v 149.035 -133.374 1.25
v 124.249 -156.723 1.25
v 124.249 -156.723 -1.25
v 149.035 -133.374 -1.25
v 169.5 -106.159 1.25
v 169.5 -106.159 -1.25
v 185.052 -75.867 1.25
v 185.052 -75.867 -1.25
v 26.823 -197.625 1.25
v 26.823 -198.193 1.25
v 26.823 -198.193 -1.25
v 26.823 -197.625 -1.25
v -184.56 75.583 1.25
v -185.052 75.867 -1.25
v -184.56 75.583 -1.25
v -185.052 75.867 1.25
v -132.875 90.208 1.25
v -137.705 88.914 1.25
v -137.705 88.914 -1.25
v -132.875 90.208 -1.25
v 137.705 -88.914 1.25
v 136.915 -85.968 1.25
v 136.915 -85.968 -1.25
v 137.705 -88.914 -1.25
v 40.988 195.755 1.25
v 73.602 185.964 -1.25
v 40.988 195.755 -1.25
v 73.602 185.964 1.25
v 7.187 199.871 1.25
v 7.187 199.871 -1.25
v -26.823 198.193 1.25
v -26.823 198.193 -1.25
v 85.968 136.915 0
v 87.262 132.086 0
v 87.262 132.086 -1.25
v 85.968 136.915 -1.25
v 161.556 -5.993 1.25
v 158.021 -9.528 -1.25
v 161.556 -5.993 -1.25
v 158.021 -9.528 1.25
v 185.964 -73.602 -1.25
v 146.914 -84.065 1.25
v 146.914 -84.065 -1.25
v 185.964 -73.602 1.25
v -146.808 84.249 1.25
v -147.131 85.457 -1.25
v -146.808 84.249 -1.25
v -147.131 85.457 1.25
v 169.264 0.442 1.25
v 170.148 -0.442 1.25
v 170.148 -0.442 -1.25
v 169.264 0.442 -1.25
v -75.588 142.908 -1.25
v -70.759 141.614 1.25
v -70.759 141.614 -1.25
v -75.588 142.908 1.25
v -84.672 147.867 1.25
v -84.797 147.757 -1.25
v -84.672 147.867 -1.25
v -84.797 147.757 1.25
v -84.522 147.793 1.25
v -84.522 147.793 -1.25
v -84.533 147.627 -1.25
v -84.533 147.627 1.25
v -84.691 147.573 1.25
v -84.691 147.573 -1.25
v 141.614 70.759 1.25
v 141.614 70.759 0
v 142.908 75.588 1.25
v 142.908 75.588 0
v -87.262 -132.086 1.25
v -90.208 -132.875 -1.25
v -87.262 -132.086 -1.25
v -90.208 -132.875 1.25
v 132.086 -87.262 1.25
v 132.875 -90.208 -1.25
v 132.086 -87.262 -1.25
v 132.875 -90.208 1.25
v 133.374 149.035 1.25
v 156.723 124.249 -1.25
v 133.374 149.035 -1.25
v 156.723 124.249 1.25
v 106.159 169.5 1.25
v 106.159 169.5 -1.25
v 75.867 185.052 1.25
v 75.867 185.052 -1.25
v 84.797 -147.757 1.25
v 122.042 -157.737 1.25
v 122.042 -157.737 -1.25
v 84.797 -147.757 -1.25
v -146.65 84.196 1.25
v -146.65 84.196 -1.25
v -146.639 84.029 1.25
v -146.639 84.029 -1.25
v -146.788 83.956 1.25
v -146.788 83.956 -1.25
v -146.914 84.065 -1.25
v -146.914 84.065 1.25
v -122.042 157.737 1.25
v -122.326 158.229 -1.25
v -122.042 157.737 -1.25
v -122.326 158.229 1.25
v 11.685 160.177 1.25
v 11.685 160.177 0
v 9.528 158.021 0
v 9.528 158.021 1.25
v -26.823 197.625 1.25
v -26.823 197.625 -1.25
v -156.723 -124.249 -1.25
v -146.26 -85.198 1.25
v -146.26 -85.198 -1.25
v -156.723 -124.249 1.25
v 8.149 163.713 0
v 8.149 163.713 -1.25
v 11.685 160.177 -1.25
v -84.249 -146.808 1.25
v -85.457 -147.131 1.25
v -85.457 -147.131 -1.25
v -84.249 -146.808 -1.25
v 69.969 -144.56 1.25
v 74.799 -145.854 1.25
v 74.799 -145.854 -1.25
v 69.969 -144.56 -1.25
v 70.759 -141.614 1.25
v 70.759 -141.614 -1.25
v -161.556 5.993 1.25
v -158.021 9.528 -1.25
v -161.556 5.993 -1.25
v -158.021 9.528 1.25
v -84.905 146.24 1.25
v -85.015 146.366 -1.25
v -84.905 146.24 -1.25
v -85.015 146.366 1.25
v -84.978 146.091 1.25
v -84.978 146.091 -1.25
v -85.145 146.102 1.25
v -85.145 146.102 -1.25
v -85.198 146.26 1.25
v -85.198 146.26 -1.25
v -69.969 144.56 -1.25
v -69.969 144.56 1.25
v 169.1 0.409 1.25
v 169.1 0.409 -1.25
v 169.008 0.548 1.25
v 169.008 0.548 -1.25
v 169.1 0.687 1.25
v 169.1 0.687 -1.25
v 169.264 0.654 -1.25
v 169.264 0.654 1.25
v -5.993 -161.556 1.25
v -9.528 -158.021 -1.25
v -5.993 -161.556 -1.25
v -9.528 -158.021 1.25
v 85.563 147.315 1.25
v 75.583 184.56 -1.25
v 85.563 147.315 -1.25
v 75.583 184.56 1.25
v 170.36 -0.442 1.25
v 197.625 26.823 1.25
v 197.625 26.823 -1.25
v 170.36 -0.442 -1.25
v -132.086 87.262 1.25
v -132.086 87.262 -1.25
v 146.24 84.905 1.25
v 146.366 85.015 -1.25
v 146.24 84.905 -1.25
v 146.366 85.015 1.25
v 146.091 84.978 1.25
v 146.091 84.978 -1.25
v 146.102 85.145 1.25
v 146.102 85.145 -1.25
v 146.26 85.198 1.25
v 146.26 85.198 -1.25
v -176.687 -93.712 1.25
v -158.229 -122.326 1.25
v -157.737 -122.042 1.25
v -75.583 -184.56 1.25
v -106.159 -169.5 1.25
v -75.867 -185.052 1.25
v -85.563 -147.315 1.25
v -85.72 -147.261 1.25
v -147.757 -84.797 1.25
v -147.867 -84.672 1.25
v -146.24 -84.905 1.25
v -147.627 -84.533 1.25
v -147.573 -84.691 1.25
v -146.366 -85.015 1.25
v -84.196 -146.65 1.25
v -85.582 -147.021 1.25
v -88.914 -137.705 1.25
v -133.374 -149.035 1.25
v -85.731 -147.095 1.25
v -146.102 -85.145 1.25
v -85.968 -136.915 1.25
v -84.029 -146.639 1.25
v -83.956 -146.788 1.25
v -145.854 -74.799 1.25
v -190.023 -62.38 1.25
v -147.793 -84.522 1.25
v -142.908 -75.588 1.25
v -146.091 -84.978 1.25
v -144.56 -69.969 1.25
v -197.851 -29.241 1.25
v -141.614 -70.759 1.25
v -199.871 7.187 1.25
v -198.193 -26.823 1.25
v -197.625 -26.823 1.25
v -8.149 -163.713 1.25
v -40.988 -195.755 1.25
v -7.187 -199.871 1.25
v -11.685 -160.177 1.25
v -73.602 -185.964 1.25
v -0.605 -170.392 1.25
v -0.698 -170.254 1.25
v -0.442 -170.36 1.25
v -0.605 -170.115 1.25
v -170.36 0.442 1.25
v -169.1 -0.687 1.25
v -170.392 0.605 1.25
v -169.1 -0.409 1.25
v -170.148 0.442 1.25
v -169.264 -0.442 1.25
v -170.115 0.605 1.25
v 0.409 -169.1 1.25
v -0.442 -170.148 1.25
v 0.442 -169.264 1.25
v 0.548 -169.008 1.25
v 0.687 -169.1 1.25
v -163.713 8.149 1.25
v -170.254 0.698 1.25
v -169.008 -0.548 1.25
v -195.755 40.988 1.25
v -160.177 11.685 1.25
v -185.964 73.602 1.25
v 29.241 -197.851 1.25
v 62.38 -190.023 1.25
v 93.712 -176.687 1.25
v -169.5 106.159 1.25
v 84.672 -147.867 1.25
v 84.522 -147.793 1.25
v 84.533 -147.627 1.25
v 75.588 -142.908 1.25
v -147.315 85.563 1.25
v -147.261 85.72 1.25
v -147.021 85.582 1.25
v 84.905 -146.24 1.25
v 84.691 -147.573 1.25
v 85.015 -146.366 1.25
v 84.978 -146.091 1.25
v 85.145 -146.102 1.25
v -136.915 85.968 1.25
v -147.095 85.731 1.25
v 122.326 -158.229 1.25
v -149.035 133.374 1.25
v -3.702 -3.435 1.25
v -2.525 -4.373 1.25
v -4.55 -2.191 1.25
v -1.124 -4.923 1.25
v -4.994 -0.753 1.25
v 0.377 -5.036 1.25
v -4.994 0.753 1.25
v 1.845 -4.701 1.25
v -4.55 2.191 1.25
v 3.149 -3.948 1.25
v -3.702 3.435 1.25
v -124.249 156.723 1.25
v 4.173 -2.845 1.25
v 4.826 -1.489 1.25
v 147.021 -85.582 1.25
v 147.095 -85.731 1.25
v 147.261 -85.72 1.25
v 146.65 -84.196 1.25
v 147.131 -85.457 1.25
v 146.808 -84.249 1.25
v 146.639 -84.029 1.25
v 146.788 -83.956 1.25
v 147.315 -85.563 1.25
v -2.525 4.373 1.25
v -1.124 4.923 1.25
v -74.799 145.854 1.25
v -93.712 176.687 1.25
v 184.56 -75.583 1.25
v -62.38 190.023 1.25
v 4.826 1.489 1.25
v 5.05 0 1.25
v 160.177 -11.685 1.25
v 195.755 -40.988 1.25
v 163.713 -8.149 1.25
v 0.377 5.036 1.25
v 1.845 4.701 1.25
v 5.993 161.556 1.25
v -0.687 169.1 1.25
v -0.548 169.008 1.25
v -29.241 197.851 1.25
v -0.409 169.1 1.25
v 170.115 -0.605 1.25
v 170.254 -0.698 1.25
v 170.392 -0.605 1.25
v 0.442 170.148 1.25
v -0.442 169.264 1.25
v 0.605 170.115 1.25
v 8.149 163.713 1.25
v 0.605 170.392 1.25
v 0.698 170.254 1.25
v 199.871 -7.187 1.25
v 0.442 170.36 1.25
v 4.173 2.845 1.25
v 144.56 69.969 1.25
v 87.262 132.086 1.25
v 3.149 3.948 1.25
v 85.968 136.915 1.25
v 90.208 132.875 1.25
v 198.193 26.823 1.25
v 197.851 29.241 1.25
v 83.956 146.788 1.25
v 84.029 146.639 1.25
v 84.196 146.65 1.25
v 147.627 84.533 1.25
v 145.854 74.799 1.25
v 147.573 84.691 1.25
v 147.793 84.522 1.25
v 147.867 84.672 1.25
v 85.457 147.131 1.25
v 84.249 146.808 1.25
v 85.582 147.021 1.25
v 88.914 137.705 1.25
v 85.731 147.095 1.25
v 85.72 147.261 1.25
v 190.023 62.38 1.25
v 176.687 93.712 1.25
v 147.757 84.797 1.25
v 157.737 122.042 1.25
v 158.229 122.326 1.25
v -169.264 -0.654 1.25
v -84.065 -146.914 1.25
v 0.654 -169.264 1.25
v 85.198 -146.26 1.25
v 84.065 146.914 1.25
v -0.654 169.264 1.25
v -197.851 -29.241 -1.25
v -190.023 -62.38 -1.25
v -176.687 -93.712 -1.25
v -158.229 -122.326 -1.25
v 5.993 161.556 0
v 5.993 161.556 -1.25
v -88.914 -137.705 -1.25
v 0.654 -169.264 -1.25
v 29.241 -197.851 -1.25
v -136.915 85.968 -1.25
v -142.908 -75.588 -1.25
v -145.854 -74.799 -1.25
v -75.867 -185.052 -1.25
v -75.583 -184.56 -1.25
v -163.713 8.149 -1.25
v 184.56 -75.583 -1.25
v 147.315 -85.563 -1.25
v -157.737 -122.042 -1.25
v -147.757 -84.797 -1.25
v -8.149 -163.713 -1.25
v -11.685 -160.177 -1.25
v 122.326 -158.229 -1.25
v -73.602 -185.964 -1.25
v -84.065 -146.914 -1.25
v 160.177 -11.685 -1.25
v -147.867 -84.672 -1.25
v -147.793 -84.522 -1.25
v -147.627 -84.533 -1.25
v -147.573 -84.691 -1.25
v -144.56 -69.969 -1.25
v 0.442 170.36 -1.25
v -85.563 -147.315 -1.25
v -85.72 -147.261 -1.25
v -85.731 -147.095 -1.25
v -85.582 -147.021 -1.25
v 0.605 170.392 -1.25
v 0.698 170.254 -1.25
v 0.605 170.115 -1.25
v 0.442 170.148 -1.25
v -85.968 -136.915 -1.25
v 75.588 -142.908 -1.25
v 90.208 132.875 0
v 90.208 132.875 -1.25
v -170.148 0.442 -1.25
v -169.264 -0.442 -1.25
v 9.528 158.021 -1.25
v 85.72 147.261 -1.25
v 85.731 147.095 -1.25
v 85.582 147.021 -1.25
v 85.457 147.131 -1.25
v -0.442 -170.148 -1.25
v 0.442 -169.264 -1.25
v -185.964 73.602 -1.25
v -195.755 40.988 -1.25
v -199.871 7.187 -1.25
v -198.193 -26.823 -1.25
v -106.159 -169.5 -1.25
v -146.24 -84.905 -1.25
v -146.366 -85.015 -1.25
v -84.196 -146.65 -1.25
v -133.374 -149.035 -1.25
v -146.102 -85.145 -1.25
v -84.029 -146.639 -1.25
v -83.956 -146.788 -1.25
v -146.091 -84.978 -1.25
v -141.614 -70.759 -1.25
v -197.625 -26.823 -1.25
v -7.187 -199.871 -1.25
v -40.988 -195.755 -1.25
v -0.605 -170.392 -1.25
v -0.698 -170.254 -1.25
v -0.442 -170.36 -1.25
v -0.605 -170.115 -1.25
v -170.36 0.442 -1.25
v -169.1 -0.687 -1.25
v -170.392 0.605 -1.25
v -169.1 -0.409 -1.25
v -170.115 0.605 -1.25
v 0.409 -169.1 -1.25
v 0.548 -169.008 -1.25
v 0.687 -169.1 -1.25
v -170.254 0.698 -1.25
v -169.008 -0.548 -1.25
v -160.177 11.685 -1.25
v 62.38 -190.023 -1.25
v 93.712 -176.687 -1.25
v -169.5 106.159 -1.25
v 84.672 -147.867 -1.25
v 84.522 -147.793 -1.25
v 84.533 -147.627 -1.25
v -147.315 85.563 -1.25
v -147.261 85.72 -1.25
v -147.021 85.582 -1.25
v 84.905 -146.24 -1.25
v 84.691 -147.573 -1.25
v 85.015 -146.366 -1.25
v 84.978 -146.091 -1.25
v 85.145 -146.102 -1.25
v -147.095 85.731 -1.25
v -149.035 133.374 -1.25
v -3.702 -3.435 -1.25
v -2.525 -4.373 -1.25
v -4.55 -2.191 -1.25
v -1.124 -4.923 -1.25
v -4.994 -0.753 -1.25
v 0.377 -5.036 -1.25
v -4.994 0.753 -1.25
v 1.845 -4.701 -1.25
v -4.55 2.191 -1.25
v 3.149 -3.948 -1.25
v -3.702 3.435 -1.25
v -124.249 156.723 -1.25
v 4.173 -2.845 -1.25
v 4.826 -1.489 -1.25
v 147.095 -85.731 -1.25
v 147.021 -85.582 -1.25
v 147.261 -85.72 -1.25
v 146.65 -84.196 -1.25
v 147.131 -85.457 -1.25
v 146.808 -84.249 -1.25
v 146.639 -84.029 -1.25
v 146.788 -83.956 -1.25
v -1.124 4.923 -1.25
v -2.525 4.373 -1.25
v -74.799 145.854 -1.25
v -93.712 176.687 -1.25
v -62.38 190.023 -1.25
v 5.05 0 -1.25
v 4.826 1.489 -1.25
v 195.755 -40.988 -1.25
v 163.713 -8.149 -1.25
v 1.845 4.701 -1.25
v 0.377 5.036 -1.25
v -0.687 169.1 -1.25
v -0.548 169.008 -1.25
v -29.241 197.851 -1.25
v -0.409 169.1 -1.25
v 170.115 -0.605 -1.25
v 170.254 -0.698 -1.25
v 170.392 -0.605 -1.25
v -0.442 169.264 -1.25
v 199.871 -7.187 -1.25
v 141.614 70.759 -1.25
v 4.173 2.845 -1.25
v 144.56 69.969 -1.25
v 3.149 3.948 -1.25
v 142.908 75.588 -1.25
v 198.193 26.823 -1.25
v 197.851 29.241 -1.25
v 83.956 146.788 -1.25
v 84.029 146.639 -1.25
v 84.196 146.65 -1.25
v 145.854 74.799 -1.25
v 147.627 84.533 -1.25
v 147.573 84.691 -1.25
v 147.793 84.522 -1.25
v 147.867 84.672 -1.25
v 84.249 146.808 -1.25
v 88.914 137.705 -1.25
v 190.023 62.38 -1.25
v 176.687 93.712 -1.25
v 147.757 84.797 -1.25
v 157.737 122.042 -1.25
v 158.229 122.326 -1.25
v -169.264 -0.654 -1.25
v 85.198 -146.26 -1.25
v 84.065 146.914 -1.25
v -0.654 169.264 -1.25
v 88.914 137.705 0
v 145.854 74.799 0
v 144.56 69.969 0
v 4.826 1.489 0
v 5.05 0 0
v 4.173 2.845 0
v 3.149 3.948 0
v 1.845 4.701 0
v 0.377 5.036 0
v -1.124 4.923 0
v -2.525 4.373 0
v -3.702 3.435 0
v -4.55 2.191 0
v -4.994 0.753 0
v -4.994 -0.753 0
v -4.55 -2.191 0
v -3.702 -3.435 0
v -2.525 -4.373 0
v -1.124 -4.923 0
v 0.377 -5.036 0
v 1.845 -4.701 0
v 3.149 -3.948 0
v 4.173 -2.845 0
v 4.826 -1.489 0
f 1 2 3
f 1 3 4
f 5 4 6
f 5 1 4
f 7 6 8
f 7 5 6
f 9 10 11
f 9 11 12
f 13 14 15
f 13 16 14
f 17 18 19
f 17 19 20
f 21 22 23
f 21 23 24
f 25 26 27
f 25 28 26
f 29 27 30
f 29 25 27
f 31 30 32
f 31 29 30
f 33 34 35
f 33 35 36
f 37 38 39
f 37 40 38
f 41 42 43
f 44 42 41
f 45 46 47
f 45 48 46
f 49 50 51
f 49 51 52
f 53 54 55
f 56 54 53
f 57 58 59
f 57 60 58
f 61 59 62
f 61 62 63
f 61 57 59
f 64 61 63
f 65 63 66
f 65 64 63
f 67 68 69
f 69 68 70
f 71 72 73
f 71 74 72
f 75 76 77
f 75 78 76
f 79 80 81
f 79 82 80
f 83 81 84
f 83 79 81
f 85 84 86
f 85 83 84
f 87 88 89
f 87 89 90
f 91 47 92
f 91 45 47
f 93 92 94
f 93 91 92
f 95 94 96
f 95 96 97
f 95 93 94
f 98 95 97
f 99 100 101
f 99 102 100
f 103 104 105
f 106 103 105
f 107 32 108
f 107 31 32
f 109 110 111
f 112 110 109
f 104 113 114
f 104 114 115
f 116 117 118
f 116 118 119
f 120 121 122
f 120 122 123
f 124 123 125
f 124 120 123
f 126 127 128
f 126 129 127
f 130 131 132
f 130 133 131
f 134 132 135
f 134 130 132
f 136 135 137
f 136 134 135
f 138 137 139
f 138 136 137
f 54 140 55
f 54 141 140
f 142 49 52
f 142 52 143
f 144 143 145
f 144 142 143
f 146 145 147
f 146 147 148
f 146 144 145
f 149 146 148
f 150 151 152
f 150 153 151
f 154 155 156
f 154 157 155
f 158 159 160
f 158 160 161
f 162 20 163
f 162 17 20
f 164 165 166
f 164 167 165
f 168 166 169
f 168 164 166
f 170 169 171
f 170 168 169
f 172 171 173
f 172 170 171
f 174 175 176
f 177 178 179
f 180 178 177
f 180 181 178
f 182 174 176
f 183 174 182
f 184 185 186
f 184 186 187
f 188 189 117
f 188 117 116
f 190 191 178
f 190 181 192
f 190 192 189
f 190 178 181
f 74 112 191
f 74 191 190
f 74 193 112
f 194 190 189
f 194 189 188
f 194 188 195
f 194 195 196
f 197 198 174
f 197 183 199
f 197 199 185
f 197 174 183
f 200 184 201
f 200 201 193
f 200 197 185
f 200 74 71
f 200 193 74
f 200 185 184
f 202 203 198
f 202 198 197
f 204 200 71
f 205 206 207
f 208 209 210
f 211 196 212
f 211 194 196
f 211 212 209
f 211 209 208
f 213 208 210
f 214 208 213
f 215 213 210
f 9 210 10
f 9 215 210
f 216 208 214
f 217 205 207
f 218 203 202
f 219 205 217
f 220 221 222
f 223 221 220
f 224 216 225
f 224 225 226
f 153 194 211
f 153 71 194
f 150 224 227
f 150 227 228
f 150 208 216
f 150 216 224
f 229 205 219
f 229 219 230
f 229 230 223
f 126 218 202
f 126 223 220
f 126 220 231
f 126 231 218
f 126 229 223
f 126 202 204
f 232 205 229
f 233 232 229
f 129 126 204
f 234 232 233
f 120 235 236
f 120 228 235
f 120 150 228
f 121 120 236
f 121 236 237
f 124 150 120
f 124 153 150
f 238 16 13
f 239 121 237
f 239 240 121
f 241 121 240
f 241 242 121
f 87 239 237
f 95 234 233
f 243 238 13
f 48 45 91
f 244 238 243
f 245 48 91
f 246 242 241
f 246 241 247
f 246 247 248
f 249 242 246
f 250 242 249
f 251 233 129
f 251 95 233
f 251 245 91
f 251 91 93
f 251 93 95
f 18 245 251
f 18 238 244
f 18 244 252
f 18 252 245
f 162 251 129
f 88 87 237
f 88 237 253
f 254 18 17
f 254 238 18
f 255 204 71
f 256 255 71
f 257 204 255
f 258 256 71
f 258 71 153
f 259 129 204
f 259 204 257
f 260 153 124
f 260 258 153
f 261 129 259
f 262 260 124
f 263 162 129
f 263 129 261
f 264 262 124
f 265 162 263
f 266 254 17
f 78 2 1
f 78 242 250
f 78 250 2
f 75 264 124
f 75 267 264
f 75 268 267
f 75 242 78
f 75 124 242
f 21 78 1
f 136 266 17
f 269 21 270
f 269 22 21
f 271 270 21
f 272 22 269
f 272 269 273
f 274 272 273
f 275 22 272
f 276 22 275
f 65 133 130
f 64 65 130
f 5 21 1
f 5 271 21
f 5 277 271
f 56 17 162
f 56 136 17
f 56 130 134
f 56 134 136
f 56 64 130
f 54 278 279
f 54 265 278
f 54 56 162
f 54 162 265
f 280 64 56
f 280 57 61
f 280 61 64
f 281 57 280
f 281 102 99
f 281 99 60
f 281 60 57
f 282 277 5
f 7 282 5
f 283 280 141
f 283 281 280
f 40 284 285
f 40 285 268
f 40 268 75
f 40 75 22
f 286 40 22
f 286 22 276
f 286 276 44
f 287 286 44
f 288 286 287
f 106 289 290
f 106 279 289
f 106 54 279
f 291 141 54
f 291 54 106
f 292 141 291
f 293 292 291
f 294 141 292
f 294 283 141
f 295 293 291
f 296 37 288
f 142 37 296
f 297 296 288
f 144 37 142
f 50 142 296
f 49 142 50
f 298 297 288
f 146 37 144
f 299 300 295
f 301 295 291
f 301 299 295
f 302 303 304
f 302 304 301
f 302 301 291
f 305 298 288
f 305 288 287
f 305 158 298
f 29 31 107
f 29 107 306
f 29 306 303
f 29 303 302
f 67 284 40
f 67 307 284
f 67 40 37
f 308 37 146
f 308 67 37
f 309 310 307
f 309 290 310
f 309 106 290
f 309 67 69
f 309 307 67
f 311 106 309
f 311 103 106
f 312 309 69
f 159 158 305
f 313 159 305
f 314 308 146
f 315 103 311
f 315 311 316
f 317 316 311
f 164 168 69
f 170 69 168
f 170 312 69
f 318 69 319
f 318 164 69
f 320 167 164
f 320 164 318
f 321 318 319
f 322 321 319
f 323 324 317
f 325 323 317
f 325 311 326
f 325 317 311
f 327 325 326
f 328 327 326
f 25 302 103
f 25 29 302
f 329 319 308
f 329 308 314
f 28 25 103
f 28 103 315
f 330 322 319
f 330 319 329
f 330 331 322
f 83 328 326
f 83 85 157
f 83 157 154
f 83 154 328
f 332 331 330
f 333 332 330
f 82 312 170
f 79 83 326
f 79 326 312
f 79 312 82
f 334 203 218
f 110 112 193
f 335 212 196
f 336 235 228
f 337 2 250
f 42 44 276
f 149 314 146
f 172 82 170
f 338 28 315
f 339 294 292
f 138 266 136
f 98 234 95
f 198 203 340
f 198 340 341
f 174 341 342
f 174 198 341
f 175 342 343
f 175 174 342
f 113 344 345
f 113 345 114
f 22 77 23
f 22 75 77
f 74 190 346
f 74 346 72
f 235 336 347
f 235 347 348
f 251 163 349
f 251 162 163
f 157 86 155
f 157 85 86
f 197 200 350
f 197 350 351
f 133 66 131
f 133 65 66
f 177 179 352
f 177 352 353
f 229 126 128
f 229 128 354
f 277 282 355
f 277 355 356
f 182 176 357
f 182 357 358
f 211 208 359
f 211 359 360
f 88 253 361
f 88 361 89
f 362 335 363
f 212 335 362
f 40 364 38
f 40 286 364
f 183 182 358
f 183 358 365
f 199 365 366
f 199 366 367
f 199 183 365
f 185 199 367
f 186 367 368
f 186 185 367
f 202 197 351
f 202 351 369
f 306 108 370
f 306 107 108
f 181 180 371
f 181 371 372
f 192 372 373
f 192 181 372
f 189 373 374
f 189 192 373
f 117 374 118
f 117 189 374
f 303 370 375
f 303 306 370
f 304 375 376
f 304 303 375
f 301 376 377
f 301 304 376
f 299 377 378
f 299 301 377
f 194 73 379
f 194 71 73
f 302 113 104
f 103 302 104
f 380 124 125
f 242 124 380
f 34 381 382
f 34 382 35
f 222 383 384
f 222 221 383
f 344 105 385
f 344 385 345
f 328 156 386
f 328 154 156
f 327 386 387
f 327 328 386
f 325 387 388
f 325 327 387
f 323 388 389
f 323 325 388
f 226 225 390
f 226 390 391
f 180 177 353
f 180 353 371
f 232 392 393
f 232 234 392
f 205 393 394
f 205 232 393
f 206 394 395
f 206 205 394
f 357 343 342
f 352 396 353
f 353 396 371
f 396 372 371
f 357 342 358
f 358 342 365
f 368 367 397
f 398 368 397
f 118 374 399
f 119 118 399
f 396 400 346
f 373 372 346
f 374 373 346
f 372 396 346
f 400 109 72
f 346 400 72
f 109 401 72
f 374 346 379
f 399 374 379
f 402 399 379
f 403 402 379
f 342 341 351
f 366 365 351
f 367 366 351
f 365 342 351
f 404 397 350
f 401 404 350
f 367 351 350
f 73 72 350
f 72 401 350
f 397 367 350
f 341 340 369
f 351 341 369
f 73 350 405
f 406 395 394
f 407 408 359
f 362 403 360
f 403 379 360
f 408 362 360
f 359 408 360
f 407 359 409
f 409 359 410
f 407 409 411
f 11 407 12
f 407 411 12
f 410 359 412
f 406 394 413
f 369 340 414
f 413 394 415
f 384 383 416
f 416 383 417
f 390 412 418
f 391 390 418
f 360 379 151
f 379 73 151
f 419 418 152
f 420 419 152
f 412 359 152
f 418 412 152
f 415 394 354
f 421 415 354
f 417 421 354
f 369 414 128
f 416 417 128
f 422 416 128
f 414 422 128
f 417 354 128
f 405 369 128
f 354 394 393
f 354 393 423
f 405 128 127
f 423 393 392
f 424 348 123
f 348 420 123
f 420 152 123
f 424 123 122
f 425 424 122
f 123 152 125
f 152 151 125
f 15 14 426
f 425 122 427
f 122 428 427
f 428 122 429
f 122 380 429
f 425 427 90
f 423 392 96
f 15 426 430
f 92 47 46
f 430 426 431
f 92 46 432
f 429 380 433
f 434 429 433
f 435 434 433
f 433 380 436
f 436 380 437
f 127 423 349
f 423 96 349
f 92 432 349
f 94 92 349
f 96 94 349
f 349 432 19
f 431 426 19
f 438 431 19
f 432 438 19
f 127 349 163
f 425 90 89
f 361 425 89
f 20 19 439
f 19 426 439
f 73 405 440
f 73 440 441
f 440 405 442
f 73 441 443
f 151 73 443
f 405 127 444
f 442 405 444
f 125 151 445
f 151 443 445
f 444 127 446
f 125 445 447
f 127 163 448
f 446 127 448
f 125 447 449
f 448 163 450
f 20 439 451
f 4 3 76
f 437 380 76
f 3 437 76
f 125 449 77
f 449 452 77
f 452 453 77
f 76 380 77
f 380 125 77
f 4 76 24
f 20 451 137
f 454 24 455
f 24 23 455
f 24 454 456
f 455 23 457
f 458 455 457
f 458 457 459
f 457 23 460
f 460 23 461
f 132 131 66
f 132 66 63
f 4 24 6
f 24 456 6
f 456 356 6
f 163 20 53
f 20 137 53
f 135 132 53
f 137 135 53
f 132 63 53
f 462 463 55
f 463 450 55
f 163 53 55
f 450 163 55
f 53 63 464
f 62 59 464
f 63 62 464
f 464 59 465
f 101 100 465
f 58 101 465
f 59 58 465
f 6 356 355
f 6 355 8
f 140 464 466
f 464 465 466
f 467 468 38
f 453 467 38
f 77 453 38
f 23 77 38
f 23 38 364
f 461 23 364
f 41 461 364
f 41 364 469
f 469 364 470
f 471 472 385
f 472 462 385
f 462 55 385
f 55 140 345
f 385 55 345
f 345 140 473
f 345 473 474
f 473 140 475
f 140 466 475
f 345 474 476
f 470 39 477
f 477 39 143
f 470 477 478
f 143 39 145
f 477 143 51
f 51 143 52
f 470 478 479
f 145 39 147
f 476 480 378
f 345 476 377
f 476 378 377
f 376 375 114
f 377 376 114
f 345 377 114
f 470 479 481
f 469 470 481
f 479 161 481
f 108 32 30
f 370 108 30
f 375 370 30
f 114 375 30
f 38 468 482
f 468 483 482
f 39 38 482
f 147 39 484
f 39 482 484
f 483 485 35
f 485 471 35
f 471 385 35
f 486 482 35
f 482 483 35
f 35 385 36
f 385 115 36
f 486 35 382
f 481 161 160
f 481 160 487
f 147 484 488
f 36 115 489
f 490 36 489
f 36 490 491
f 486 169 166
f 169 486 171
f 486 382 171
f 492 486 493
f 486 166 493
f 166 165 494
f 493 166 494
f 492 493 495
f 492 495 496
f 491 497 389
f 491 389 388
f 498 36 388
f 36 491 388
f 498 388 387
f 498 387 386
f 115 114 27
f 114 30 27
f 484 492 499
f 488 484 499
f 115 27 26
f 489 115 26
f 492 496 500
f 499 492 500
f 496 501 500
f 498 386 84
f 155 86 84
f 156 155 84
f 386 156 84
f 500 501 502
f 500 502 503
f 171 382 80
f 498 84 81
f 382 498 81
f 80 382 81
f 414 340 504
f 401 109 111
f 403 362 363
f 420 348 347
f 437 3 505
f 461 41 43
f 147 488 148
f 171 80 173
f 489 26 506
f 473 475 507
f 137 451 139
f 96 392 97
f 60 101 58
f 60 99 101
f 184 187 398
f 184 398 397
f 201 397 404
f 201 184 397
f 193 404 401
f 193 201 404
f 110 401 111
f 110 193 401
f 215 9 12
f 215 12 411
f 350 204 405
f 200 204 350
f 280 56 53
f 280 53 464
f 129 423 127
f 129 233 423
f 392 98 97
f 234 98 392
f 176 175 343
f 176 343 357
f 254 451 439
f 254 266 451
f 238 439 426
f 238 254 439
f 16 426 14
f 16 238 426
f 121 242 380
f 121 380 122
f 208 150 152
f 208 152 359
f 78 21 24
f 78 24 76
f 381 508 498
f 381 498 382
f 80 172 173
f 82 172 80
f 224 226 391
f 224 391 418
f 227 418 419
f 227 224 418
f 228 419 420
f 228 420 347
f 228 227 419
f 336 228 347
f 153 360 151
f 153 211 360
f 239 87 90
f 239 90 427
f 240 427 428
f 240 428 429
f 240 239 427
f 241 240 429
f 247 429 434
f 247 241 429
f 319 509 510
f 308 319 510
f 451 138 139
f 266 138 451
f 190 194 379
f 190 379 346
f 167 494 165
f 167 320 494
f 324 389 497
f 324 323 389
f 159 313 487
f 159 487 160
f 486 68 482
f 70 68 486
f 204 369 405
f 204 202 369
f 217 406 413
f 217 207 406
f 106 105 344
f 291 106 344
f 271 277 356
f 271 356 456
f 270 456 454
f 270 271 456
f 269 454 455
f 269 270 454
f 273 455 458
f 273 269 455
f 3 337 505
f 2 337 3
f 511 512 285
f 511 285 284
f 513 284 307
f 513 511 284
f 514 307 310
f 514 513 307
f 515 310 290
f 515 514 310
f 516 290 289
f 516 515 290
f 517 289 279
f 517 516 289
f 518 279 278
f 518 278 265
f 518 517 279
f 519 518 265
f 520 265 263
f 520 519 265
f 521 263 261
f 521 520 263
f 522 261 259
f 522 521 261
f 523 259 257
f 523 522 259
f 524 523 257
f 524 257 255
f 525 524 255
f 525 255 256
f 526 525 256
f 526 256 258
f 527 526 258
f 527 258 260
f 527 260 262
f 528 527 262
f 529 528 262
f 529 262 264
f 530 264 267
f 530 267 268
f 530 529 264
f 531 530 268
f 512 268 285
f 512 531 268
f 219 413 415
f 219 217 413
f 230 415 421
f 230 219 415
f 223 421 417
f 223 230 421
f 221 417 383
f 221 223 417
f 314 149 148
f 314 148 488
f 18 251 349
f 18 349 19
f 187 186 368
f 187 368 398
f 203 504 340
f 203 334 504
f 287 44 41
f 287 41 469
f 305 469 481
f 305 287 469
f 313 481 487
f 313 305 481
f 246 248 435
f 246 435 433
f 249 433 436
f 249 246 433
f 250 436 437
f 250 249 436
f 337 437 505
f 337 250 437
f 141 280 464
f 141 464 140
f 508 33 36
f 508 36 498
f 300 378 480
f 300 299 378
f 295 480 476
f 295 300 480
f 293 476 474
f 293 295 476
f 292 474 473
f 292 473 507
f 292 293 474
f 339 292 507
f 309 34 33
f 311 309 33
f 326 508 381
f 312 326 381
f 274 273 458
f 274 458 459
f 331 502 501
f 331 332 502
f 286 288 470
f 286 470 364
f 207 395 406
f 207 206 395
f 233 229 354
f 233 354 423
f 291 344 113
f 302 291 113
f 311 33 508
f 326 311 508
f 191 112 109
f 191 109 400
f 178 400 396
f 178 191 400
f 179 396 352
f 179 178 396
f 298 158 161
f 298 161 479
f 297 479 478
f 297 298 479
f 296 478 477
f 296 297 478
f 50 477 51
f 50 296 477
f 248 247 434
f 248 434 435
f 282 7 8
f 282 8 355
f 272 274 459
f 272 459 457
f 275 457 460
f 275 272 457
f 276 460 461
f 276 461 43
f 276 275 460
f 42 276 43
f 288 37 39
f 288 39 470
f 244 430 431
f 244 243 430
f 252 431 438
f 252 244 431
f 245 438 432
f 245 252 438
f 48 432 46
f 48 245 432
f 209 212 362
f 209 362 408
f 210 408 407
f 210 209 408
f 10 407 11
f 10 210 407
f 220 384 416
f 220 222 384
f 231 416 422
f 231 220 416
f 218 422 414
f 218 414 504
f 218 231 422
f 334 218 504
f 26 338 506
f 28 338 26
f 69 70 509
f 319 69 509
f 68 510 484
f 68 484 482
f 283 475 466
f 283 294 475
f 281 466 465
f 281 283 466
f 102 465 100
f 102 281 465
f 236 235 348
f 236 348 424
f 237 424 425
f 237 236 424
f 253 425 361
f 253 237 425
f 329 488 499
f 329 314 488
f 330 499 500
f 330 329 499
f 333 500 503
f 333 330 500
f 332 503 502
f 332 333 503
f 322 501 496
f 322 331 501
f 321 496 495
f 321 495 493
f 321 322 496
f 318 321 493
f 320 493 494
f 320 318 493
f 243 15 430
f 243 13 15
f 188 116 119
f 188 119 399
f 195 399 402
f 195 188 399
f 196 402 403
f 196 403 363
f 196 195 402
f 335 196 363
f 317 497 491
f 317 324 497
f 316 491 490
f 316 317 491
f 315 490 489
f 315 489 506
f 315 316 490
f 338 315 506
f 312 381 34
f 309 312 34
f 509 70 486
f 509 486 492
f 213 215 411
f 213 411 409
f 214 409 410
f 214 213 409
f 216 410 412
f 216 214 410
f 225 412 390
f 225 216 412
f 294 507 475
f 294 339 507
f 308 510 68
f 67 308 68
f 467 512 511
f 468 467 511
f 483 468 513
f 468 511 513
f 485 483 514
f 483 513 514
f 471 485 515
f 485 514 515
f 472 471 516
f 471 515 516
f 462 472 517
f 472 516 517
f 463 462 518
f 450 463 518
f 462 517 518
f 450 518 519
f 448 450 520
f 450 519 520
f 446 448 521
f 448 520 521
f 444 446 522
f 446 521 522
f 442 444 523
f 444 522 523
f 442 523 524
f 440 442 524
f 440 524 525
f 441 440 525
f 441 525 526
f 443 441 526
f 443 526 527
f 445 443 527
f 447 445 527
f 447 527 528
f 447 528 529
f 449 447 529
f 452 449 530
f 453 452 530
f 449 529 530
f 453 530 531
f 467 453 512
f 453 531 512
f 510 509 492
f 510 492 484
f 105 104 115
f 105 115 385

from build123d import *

# Parameters (mm, degrees)
F0_R          = 5.05
F1_DEPTH      = 1.25
F1_DEPTH_BACK = 1.25


with BuildPart() as f1:
    # F0 (on Top) → F1 (new body, two sides)
    with BuildSketch(Plane.XY) as f1_sk:
        with BuildLine():
            Line((-169.263686, -0.654074), (-197.850831, -29.241219))
            ThreePointArc((-197.850831, -29.241219), (-184.022709, -78.330343), (-158.228698, -122.326118))
            Line((-158.228698, -122.326118), (-157.736526, -122.041962))
            Line((-157.736526, -122.041962), (-147.7568, -84.797118))
            ThreePointArc((-147.7568, -84.797118), (-147.792977, -84.522325), (-147.573088, -84.691052))
            Line((-147.573088, -84.691052), (-146.365681, -85.014576))
            ThreePointArc((-146.365681, -85.014576), (-146.090888, -84.978399), (-146.259615, -85.198287))
            Line((-146.259615, -85.198287), (-156.723236, -124.249053))
            ThreePointArc((-156.723236, -124.249053), (-120.203169, -159.847422), (-75.867013, -185.051875))
            Line((-75.867013, -185.051875), (-75.582858, -184.559702))
            Line((-75.582858, -184.559702), (-85.562583, -147.314858))
            ThreePointArc((-85.562583, -147.314858), (-85.73131, -147.094969), (-85.456517, -147.131146))
            Line((-85.456517, -147.131146), (-84.24911, -146.807623))
            ThreePointArc((-84.24911, -146.807623), (-84.029221, -146.638896), (-84.065398, -146.913689))
            Line((-84.065398, -146.913689), (-73.601777, -185.964455))
            ThreePointArc((-73.601777, -185.964455), (-24.175287, -198.533512), (26.823176, -198.193131))
            Line((26.823176, -198.193131), (26.823176, -197.624819))
            Line((26.823176, -197.624819), (-0.441942, -170.359701))
            ThreePointArc((-0.441942, -170.359701), (-0.698008, -170.253635), (-0.441942, -170.147569))
            Line((-0.441942, -170.147569), (0.441942, -169.263686))
            ThreePointArc((0.441942, -169.263686), (0.548008, -169.00762), (0.654074, -169.263686))
            Line((0.654074, -169.263686), (29.241219, -197.850831))
            ThreePointArc((29.241219, -197.850831), (78.330343, -184.022709), (122.326118, -158.228698))
            Line((122.326118, -158.228698), (122.041962, -157.736526))
            Line((122.041962, -157.736526), (84.797118, -147.7568))
            ThreePointArc((84.797118, -147.7568), (84.522325, -147.792977), (84.691052, -147.573088))
            Line((84.691052, -147.573088), (85.014576, -146.365681))
            ThreePointArc((85.014576, -146.365681), (84.978399, -146.090888), (85.198287, -146.259615))
            Line((85.198287, -146.259615), (124.249053, -156.723236))
            ThreePointArc((124.249053, -156.723236), (159.847422, -120.203169), (185.051875, -75.867013))
            Line((185.051875, -75.867013), (184.559702, -75.582858))
            Line((184.559702, -75.582858), (147.314858, -85.562583))
            ThreePointArc((147.314858, -85.562583), (147.094969, -85.73131), (147.131146, -85.456517))
            Line((147.131146, -85.456517), (146.807623, -84.24911))
            ThreePointArc((146.807623, -84.24911), (146.638896, -84.029221), (146.913689, -84.065398))
            Line((146.913689, -84.065398), (185.964455, -73.601777))
            ThreePointArc((185.964455, -73.601777), (198.533512, -24.175287), (198.193131, 26.823176))
            Line((198.193131, 26.823176), (197.624819, 26.823176))
            Line((197.624819, 26.823176), (170.359701, -0.441942))
            ThreePointArc((170.359701, -0.441942), (170.253635, -0.698008), (170.147569, -0.441942))
            Line((170.147569, -0.441942), (169.263686, 0.441942))
            ThreePointArc((169.263686, 0.441942), (169.00762, 0.548008), (169.263686, 0.654074))
            Line((169.263686, 0.654074), (197.850831, 29.241219))
            ThreePointArc((197.850831, 29.241219), (184.022709, 78.330343), (158.228698, 122.326118))
            Line((158.228698, 122.326118), (157.736526, 122.041962))
            Line((157.736526, 122.041962), (147.7568, 84.797118))
            ThreePointArc((147.7568, 84.797118), (147.792977, 84.522325), (147.573088, 84.691052))
            Line((147.573088, 84.691052), (146.365681, 85.014576))
            ThreePointArc((146.365681, 85.014576), (146.090888, 84.978399), (146.259615, 85.198287))
            Line((146.259615, 85.198287), (156.723236, 124.249053))
            ThreePointArc((156.723236, 124.249053), (120.203169, 159.847422), (75.867013, 185.051875))
            Line((75.867013, 185.051875), (75.582858, 184.559702))
            Line((75.582858, 184.559702), (85.562583, 147.314858))
            ThreePointArc((85.562583, 147.314858), (85.73131, 147.094969), (85.456517, 147.131146))
            Line((85.456517, 147.131146), (84.24911, 146.807623))
            ThreePointArc((84.24911, 146.807623), (84.029221, 146.638896), (84.065398, 146.913689))
            Line((84.065398, 146.913689), (73.601777, 185.964455))
            ThreePointArc((73.601777, 185.964455), (24.175287, 198.533512), (-26.823176, 198.193131))
            Line((-26.823176, 198.193131), (-26.823176, 197.624819))
            Line((-26.823176, 197.624819), (0.441942, 170.359701))
            ThreePointArc((0.441942, 170.359701), (0.698008, 170.253635), (0.441942, 170.147569))
            Line((0.441942, 170.147569), (-0.441942, 169.263686))
            ThreePointArc((-0.441942, 169.263686), (-0.548008, 169.00762), (-0.654074, 169.263686))
            Line((-0.654074, 169.263686), (-29.241219, 197.850831))
            ThreePointArc((-29.241219, 197.850831), (-78.330343, 184.022709), (-122.326118, 158.228698))
            Line((-122.326118, 158.228698), (-122.041962, 157.736526))
            Line((-122.041962, 157.736526), (-84.797118, 147.7568))
            ThreePointArc((-84.797118, 147.7568), (-84.522325, 147.792977), (-84.691052, 147.573088))
            Line((-84.691052, 147.573088), (-85.014576, 146.365681))
            ThreePointArc((-85.014576, 146.365681), (-84.978399, 146.090888), (-85.198287, 146.259615))
            Line((-85.198287, 146.259615), (-124.249053, 156.723236))
            ThreePointArc((-124.249053, 156.723236), (-159.847422, 120.203169), (-185.051875, 75.867013))
            Line((-185.051875, 75.867013), (-184.559702, 75.582858))
            Line((-184.559702, 75.582858), (-147.314858, 85.562583))
            ThreePointArc((-147.314858, 85.562583), (-147.094969, 85.73131), (-147.131146, 85.456517))
            Line((-147.131146, 85.456517), (-146.807623, 84.24911))
            ThreePointArc((-146.807623, 84.24911), (-146.638896, 84.029221), (-146.913689, 84.065398))
            Line((-146.913689, 84.065398), (-185.964455, 73.601777))
            ThreePointArc((-185.964455, 73.601777), (-198.533512, 24.175287), (-198.193131, -26.823176))
            Line((-198.193131, -26.823176), (-197.624819, -26.823176))
            Line((-197.624819, -26.823176), (-170.359701, 0.441942))
            ThreePointArc((-170.359701, 0.441942), (-170.253635, 0.698008), (-170.147569, 0.441942))
            Line((-170.147569, 0.441942), (-169.263686, -0.441942))
            ThreePointArc((-169.263686, -0.441942), (-169.00762, -0.548008), (-169.263686, -0.654074))
        make_face()
        Polygon((-5.99273, -161.556222), (-8.149406, -163.712898), (-11.68494, -160.177364), (-9.528264, -158.020688), align=None, mode=Mode.SUBTRACT)
        Polygon((-85.967967, -136.915427), (-88.914041, -137.704825), (-90.208136, -132.875196), (-87.262063, -132.085798), align=None, mode=Mode.SUBTRACT)
        Polygon((-142.908157, -75.588255), (-145.854231, -74.798856), (-144.560136, -69.969227), (-141.614062, -70.758625), align=None, mode=Mode.SUBTRACT)
        Polygon((75.588255, -142.908157), (74.798856, -145.854231), (69.969227, -144.560136), (70.758625, -141.614062), align=None, mode=Mode.SUBTRACT)
        Circle(F0_R, mode=Mode.SUBTRACT)
        Polygon((136.915427, -85.967967), (137.704825, -88.914041), (132.875196, -90.208136), (132.085798, -87.262063), align=None, mode=Mode.SUBTRACT)
        Polygon((161.556222, -5.99273), (163.712898, -8.149406), (160.177364, -11.68494), (158.020688, -9.528264), align=None, mode=Mode.SUBTRACT)
        Polygon((-161.556222, 5.99273), (-163.712898, 8.149406), (-160.177364, 11.68494), (-158.020688, 9.528264), align=None, mode=Mode.SUBTRACT)
        Polygon((-136.915427, 85.967967), (-137.704825, 88.914041), (-132.875196, 90.208136), (-132.085798, 87.262063), align=None, mode=Mode.SUBTRACT)
        Polygon((-75.588255, 142.908157), (-74.798856, 145.854231), (-69.969227, 144.560136), (-70.758625, 141.614062), align=None, mode=Mode.SUBTRACT)
        Polygon((142.908157, 75.588255), (145.854231, 74.798856), (144.560136, 69.969227), (141.614062, 70.758625), align=None, mode=Mode.SUBTRACT)
        Polygon((85.967967, 136.915427), (88.914041, 137.704825), (90.208136, 132.875196), (87.262063, 132.085798), align=None, mode=Mode.SUBTRACT)
        Polygon((5.99273, 161.556222), (8.149406, 163.712898), (11.68494, 160.177364), (9.528264, 158.020688), align=None, mode=Mode.SUBTRACT)
    extrude(amount=F1_DEPTH)
    extrude(f1_sk.sketch, amount=-F1_DEPTH_BACK)


solid = f1.part
